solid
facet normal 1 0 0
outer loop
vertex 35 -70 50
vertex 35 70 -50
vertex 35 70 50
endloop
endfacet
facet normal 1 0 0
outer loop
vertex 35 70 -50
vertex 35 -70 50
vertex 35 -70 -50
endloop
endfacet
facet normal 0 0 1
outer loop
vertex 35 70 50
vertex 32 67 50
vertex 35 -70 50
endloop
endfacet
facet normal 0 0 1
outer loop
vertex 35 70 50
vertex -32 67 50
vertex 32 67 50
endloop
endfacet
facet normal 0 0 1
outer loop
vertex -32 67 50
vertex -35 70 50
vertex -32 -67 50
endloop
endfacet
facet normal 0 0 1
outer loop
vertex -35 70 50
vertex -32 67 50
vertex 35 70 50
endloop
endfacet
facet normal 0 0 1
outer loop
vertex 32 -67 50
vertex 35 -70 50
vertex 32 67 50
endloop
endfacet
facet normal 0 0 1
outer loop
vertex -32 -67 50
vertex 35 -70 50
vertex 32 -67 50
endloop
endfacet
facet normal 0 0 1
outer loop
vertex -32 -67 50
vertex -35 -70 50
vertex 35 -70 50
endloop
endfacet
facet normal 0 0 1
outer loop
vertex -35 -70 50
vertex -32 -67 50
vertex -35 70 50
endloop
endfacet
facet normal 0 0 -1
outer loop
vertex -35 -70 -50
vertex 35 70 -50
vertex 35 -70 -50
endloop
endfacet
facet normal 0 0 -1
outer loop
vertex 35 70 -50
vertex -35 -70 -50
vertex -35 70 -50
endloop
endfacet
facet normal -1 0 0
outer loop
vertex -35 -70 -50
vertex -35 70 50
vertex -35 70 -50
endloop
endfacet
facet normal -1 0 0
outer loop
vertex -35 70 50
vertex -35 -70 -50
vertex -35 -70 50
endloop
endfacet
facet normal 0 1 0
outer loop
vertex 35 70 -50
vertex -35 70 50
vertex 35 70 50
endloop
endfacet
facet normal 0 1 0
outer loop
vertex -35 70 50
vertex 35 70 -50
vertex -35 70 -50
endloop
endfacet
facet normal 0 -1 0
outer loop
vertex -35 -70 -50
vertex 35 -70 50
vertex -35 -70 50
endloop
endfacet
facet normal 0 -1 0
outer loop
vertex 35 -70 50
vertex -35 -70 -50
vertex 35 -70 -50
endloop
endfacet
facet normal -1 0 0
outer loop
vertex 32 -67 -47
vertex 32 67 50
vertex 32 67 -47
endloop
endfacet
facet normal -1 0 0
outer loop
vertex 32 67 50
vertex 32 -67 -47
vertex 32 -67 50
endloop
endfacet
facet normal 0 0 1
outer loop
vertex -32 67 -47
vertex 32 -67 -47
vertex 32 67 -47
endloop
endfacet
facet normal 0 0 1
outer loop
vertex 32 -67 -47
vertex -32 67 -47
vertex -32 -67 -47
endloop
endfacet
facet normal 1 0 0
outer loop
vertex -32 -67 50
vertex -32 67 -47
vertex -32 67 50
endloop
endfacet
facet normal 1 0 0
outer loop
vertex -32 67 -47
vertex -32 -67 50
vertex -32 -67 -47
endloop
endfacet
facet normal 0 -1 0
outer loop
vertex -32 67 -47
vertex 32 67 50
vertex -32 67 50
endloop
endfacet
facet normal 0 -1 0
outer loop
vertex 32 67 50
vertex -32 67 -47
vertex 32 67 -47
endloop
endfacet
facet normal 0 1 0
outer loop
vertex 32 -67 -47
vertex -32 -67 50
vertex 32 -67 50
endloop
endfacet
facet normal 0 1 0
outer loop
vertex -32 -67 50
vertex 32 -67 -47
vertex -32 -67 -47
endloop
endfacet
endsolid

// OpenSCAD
// ========================================
// a 70 x 140 x 100 mm enclosure with 3 mm wall thickness
// NeuroCAD canonical IR; dimensions are millimetres
// ========================================
$fn = 48;

difference() {
  cube(size=[70, 140, 100], center=true);
  translate([0, 0, 1.6]) {
    cube(size=[64, 134, 97.2], center=true);
  }
}
